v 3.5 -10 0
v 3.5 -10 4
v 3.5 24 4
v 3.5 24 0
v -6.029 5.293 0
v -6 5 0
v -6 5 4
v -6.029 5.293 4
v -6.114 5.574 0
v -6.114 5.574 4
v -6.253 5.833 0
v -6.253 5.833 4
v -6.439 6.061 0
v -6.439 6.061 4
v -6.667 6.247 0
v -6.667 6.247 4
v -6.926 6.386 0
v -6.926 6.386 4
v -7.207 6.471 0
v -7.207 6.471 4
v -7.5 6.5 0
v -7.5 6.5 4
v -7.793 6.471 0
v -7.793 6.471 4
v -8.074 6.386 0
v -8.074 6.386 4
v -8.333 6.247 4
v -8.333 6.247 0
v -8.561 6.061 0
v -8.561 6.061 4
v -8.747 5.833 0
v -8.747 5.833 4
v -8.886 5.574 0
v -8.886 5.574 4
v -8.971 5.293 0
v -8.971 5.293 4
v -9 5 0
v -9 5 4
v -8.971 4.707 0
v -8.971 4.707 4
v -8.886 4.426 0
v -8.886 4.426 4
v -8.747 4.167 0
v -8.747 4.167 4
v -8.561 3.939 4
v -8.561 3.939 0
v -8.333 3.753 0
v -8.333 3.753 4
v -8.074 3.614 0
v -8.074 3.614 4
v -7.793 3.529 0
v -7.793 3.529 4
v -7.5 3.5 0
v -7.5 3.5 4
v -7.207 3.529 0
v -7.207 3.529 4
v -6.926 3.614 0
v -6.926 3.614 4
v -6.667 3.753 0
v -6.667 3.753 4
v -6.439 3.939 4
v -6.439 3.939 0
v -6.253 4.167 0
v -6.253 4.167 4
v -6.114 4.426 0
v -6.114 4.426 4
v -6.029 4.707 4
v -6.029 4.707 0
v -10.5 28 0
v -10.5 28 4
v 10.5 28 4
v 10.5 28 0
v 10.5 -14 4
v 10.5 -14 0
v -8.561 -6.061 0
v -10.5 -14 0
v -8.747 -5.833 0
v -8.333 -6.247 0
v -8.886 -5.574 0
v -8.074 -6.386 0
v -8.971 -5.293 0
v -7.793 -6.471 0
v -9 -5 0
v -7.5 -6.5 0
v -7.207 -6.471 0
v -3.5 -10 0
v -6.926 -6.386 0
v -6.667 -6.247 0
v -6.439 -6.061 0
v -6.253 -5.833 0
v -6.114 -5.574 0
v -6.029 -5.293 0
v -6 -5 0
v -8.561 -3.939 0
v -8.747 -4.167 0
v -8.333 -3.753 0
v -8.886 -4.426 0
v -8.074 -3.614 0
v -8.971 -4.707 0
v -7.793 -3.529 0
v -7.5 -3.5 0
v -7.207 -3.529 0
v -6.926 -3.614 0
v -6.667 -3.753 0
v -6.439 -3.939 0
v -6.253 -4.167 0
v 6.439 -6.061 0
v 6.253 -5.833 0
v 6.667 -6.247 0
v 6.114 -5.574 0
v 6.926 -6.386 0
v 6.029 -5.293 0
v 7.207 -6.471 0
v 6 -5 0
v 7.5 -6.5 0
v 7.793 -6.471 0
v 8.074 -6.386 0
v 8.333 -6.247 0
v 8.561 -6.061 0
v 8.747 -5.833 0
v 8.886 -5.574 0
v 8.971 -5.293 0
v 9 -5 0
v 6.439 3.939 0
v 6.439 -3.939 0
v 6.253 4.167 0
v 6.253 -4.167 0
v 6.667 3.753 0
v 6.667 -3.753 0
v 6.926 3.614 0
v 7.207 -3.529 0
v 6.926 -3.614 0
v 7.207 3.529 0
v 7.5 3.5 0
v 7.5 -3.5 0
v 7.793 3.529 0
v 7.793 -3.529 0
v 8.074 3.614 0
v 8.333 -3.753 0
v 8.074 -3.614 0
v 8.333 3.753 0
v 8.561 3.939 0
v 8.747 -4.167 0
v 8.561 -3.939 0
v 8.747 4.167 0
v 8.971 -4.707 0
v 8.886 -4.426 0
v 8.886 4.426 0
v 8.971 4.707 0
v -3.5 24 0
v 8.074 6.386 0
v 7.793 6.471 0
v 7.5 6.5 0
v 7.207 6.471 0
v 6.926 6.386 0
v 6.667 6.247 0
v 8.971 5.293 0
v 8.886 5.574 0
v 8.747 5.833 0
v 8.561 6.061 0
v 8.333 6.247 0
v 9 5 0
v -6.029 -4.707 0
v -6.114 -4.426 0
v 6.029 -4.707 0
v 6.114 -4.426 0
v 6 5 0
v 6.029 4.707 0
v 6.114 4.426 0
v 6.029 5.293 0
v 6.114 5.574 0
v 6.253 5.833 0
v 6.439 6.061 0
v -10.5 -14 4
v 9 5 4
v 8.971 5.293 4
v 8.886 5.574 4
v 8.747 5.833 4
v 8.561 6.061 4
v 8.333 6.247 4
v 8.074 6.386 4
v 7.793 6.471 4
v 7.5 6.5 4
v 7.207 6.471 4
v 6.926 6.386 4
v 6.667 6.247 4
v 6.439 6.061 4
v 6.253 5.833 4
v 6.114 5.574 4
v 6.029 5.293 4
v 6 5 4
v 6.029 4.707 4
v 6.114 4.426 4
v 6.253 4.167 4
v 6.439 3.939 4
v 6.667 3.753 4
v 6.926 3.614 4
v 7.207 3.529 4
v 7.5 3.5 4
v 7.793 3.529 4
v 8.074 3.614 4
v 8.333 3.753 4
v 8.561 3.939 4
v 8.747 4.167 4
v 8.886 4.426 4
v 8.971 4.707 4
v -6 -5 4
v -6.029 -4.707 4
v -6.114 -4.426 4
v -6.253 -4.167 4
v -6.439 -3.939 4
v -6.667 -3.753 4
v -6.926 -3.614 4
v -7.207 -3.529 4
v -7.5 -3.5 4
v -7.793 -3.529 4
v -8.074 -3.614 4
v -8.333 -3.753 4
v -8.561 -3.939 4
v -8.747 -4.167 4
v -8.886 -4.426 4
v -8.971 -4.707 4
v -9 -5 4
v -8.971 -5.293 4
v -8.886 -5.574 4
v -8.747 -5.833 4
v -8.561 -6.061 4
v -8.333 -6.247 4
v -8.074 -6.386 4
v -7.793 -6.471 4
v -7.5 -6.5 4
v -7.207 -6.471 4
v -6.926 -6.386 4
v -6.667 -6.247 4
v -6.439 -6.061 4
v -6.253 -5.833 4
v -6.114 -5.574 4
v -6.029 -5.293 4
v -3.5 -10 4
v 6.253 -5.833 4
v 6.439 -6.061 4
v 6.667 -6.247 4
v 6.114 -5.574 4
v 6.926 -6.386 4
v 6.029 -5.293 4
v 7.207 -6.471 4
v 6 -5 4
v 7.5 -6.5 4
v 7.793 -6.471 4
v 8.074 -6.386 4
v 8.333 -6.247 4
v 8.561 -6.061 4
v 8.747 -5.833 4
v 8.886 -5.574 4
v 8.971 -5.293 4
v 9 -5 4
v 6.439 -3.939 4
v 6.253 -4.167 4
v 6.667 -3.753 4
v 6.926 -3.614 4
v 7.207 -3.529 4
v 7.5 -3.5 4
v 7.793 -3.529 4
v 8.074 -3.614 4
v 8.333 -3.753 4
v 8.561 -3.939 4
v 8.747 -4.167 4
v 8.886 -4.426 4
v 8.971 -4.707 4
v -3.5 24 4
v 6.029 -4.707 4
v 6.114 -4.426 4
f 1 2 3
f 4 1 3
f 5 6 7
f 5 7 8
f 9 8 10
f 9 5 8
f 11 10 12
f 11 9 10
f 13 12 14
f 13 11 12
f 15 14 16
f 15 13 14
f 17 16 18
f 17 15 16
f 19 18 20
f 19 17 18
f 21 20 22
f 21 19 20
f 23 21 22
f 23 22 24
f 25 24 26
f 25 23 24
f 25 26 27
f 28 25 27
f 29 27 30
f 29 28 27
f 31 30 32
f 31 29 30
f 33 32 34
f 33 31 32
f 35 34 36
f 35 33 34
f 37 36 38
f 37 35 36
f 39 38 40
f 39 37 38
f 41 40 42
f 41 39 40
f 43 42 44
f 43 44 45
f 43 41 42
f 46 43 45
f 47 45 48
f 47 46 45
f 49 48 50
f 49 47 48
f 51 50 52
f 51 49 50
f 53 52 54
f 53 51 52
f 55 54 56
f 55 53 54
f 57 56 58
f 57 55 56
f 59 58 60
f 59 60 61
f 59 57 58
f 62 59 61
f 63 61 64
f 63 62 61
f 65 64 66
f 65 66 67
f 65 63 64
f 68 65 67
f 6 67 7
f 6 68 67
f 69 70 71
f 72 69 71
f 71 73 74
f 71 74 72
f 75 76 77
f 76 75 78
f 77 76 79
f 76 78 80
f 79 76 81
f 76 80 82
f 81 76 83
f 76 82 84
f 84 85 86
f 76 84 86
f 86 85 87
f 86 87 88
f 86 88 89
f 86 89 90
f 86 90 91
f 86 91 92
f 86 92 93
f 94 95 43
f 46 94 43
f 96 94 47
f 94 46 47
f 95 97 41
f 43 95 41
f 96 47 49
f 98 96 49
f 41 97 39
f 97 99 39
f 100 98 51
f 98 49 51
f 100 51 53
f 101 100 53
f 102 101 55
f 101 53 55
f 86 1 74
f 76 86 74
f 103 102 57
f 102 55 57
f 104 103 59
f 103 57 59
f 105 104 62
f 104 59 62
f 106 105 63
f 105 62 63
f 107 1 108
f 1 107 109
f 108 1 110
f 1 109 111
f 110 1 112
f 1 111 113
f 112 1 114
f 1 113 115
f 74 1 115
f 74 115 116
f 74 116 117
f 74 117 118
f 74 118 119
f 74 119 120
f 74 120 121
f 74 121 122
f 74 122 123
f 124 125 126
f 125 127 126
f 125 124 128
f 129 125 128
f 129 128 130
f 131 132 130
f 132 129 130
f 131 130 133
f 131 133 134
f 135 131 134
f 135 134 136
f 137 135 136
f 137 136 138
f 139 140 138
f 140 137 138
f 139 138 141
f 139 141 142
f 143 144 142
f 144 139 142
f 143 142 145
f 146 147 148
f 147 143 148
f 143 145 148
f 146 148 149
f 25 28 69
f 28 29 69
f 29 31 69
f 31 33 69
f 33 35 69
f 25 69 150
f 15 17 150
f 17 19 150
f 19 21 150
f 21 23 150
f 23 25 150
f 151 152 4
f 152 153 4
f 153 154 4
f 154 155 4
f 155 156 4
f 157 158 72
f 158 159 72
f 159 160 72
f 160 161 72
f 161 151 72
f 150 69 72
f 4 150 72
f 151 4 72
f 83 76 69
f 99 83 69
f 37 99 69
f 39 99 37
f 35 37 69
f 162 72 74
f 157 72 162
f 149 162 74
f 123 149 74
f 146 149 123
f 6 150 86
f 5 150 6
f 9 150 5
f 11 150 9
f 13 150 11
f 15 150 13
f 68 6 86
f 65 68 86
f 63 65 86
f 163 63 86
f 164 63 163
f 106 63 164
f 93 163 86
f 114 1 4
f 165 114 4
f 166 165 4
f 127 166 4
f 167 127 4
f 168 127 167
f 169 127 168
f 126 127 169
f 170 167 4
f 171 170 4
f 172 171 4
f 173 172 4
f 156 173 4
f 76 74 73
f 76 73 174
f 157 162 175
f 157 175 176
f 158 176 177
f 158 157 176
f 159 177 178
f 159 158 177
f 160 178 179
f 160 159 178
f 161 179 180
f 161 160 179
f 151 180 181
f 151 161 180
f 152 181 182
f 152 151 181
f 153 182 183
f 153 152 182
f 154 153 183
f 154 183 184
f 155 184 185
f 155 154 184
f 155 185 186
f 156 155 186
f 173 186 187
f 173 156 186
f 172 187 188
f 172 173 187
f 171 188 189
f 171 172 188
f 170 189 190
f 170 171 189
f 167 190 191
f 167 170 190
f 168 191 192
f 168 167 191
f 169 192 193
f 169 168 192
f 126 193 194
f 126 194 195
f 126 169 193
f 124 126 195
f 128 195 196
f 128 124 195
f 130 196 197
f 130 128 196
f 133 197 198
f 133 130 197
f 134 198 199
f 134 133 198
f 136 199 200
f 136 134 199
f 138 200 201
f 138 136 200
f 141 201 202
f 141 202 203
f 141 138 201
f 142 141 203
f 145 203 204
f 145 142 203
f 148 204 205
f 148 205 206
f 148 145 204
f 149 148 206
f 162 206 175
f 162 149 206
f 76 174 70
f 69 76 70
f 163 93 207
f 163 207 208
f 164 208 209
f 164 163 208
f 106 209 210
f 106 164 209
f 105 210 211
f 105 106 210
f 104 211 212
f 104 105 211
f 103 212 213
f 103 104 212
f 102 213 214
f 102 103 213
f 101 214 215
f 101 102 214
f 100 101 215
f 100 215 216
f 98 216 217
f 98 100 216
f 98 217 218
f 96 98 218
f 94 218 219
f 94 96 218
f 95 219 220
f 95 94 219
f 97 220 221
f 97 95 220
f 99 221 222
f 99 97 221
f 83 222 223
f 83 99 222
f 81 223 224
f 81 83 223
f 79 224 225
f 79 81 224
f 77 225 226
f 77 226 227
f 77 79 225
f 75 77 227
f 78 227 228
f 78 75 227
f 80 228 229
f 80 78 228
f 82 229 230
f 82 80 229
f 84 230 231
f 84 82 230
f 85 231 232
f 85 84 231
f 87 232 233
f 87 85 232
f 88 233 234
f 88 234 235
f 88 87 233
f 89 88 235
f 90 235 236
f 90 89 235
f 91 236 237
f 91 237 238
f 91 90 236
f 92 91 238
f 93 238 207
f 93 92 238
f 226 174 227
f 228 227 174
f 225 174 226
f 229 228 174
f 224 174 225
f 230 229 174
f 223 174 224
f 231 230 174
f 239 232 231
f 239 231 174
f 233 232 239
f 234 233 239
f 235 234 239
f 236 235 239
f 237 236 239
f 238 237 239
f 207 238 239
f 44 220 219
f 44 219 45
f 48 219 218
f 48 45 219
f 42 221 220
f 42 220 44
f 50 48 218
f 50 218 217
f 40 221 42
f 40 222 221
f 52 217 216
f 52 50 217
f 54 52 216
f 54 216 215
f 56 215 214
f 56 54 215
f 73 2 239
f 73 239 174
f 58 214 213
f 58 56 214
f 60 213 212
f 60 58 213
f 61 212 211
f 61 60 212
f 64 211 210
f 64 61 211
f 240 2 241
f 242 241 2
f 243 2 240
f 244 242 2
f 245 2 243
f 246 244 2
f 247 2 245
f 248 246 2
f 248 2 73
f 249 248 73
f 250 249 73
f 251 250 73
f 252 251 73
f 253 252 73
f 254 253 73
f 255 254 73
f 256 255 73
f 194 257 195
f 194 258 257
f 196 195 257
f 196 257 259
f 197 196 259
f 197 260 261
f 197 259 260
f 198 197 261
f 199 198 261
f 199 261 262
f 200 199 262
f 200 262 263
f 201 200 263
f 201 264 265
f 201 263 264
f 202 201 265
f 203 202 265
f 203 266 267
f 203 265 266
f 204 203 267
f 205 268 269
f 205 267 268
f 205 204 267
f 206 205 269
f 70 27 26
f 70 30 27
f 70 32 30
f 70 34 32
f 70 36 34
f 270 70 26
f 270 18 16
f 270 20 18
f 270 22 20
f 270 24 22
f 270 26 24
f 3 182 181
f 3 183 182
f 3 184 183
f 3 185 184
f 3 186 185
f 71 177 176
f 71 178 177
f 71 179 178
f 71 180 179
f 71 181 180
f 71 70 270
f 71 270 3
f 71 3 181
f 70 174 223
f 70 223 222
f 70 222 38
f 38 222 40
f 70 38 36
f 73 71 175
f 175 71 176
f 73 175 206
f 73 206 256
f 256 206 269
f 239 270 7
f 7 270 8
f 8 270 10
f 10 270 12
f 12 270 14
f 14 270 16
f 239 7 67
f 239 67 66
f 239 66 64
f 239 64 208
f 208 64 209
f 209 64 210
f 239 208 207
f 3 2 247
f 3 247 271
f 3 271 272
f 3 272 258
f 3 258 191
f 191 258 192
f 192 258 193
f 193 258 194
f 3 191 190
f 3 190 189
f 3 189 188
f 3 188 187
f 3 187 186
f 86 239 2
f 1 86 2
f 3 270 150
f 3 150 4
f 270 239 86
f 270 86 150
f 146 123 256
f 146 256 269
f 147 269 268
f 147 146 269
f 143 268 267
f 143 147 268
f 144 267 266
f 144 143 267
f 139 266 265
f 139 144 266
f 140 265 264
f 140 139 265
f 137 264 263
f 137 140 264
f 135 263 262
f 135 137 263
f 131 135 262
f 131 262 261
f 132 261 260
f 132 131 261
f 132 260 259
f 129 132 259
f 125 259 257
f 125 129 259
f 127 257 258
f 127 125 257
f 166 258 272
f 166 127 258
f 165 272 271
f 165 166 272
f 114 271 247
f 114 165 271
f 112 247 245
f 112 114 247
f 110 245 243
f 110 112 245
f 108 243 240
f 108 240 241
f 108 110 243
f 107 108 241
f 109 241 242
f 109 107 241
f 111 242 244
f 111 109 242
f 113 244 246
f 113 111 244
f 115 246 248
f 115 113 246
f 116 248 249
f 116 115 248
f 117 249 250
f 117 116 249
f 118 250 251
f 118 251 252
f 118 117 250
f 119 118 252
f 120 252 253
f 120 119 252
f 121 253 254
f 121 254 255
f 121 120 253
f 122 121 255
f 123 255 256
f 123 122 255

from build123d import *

# Parameters (mm, degrees)
SKETCH_1_R          = 1.5
EXTRUDE_1_DEPTH     = 4
FILLET_1_R          = 2
SKETCH_3_W          = 25.138692766
SKETCH_3_H          = 29.703861026
CUT_EXTRUDE_1_DEPTH = 38.446628687
SKETCH_4_W          = 21
SKETCH_4_H          = 14
EXTRUDE_2_DEPTH     = 4
SKETCH_5_W          = 7
SKETCH_5_H          = 34
CUT_EXTRUDE_2_DEPTH = 31.170349683


with BuildPart() as part:
    # 草图1 → 凸台-拉伸1 (new body)
    with BuildSketch(Plane.XY):
        Polygon((-10.5, 14), (10.5, 14), (10.5, 4), (34.5, 4), (34.5, -4), (10.5, -4), (10.5, -14), (-10.5, -14), align=None)
        with Locations((-7.5, 5)):
            Circle(SKETCH_1_R, mode=Mode.SUBTRACT)
        with Locations((7.5, 5)):
            Circle(SKETCH_1_R, mode=Mode.SUBTRACT)
        with Locations((-7.5, -5)):
            Circle(SKETCH_1_R, mode=Mode.SUBTRACT)
        with Locations((7.5, -5)):
            Circle(SKETCH_1_R, mode=Mode.SUBTRACT)
        with Locations((16.5, 0)):
            Circle(SKETCH_1_R, mode=Mode.SUBTRACT)
        with Locations((31.5, 0)):
            Circle(SKETCH_1_R, mode=Mode.SUBTRACT)
    extrude(amount=EXTRUDE_1_DEPTH)

    # 圆角1
    fillet_1_edges = [part.edges().sort_by_distance(p)[0] for p in [
        (10.5, 4, 2),
        (10.5, -4, 2),
    ]]
    fillet(fillet_1_edges, radius=FILLET_1_R)

    # 草图3 → 切除-拉伸1 (cut, through all)
    with BuildSketch(Plane.XY.offset(4)):
        with Locations((23.069346383, -0.851930513)):
            Rectangle(SKETCH_3_W, SKETCH_3_H)
    extrude(amount=-CUT_EXTRUDE_1_DEPTH, mode=Mode.SUBTRACT)

    # 草图4 → 凸台-拉伸2 (add)
    with BuildSketch(Plane.XY.offset(4)):
        with Locations((0, 21)):
            Rectangle(SKETCH_4_W, SKETCH_4_H)
    extrude(amount=-EXTRUDE_2_DEPTH)

    # 草图5 → 切除-拉伸2 (cut, through all)
    with BuildSketch(Plane.XY.offset(4)):
        with Locations((0, 7)):
            Rectangle(SKETCH_5_W, SKETCH_5_H)
    extrude(amount=-CUT_EXTRUDE_2_DEPTH, mode=Mode.SUBTRACT)


solid = part.part
